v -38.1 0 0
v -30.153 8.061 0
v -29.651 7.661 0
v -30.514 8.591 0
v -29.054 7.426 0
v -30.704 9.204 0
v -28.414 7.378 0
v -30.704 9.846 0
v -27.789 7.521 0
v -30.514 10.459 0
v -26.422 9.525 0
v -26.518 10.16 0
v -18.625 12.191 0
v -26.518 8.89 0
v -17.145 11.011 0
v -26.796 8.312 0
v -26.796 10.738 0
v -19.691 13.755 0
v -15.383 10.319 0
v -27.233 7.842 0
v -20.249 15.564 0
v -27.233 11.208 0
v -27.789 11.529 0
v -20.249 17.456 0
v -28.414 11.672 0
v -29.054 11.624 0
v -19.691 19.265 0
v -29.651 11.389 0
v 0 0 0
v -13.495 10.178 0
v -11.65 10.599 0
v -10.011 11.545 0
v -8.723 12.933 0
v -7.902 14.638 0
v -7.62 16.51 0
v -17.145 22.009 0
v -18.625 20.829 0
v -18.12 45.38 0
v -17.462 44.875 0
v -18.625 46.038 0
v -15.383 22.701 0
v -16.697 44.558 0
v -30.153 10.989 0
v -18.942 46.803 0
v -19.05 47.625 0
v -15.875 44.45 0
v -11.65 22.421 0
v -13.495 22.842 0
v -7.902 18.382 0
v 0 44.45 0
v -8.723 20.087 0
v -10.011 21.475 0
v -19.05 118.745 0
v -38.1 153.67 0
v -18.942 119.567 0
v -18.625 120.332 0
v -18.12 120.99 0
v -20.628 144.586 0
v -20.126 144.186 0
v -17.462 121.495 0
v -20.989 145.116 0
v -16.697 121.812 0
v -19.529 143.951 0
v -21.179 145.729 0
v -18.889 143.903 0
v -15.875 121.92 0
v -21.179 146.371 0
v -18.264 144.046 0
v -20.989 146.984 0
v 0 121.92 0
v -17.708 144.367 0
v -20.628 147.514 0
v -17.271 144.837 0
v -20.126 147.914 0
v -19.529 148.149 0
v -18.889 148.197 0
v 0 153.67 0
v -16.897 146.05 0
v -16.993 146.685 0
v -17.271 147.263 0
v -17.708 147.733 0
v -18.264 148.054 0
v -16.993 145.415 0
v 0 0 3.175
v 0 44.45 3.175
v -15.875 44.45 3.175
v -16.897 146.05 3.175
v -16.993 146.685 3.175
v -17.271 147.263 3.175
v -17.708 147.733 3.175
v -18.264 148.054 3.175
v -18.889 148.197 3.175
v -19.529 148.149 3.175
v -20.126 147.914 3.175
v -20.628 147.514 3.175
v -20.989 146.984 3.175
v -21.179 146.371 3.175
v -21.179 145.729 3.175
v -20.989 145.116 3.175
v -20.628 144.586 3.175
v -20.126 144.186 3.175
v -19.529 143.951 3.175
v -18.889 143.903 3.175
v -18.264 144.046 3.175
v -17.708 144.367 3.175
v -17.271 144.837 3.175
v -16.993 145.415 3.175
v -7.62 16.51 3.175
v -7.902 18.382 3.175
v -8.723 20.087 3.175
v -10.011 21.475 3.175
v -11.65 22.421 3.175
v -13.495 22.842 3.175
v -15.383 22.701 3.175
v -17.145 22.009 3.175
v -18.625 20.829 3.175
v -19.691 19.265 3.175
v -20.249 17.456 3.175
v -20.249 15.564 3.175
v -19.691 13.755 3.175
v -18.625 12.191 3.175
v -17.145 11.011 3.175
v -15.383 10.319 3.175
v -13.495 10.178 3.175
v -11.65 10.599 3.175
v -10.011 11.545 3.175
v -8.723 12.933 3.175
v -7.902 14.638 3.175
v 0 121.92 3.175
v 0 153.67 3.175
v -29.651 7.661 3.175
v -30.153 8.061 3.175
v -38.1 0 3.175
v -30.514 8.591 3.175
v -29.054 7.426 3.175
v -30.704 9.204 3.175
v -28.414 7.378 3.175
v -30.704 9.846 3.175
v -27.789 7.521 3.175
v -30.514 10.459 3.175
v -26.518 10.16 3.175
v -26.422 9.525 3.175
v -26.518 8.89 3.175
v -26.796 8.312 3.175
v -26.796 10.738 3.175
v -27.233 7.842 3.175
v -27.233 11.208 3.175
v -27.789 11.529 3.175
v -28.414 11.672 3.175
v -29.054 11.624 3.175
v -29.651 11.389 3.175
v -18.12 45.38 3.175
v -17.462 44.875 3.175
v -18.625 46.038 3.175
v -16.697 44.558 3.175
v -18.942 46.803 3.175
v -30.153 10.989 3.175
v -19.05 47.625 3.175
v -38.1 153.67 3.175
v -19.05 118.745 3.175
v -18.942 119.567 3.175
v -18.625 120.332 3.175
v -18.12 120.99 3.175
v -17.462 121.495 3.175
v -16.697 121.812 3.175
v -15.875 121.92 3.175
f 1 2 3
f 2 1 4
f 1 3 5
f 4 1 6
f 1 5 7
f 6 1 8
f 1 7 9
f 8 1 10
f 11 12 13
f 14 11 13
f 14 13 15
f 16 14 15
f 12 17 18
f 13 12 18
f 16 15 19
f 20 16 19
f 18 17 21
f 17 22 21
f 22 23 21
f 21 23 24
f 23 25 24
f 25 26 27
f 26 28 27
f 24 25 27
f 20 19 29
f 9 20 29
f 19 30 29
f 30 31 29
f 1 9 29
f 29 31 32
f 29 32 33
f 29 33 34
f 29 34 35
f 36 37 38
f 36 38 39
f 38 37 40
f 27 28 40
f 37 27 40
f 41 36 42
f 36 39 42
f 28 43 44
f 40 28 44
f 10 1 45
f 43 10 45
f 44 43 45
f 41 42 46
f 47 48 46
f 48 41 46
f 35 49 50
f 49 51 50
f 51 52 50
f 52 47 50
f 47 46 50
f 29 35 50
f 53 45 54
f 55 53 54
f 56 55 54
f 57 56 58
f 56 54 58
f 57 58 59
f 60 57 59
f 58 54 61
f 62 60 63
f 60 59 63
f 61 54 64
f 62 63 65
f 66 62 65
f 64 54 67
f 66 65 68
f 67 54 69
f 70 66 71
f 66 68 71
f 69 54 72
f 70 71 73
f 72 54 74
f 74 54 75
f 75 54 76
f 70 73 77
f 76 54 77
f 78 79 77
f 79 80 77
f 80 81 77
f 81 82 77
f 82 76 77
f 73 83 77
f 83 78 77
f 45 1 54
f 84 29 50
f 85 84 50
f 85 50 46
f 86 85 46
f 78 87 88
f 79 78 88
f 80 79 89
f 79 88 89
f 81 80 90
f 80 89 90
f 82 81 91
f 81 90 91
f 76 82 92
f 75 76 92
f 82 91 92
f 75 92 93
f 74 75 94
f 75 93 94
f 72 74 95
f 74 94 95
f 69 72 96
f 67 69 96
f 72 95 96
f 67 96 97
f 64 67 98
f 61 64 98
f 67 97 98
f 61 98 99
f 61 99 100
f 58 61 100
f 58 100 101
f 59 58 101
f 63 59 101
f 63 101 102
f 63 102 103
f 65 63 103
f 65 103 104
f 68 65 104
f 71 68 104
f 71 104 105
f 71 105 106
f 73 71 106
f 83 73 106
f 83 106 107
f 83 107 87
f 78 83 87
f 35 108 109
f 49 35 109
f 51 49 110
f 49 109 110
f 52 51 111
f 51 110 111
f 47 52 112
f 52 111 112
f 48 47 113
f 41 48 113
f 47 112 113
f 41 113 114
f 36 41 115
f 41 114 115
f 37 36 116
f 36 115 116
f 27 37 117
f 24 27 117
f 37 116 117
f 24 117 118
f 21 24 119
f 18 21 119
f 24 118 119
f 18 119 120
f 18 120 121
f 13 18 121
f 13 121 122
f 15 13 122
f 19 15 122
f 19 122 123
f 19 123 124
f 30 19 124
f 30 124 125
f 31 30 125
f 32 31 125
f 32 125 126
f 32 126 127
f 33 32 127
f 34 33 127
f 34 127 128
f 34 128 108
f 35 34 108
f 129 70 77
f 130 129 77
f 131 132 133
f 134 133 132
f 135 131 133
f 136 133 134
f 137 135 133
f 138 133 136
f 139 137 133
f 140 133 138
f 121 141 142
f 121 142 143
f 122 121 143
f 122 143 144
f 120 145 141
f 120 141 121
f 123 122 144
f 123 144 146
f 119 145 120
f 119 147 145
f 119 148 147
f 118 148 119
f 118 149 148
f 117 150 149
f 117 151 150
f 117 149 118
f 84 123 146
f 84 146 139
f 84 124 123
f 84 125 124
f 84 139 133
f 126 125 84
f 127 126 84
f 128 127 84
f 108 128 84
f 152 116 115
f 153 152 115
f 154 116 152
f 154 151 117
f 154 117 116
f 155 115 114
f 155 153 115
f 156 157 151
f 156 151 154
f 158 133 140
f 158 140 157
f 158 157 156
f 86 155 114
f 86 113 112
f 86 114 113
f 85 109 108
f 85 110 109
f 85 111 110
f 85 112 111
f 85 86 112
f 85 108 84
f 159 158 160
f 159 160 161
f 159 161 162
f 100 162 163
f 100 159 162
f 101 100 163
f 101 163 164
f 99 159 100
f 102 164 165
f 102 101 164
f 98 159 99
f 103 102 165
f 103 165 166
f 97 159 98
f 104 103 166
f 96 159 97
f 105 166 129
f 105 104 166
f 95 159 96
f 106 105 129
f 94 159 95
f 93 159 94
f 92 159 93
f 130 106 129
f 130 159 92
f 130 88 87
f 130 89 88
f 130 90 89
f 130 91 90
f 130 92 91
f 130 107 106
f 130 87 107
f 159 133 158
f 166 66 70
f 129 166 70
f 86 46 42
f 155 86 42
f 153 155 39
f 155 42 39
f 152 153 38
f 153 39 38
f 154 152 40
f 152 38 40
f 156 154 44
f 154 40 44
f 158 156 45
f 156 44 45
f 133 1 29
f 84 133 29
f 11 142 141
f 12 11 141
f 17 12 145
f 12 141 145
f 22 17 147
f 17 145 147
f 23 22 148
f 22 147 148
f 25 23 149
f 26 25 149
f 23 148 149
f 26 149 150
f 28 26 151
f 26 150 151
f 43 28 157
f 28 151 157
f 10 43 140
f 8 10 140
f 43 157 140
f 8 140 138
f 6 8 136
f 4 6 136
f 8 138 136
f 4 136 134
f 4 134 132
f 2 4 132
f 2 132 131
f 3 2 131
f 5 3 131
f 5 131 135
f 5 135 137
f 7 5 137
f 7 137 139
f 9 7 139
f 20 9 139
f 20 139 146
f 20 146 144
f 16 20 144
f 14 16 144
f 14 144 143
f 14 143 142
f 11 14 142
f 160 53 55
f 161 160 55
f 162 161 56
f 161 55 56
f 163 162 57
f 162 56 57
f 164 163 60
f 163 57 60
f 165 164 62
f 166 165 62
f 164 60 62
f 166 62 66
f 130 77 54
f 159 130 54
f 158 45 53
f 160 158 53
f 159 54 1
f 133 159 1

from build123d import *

# Parameters (mm, degrees)
BOSS_EXTRUDE1_DEPTH        = 3.175
F_6_CLEARANCE_HOLE1_D      = 4.3053
F_1_2_0_5_DIAMETER_HOLE1_D = 12.7


with BuildPart() as part:
    # Sketch1 → Boss-Extrude1 (new body)
    with BuildSketch(Plane.XY):
        with BuildLine():
            Line((0, 0), (0, 44.45))
            Line((0, 44.45), (-15.875, 44.45))
            ThreePointArc((-15.875, 44.45), (-18.12006403, 45.37993597), (-19.05, 47.625))
            Line((-19.05, 47.625), (-19.05, 118.745))
            ThreePointArc((-19.05, 118.745), (-18.12006403, 120.99006403), (-15.875, 121.92))
            Line((-15.875, 121.92), (0, 121.92))
            Line((0, 121.92), (0, 153.67))
            Line((0, 153.67), (-38.1, 153.67))
            Line((-38.1, 153.67), (-38.1, 0))
            Line((-38.1, 0), (0, 0))
        make_face()
    extrude(amount=BOSS_EXTRUDE1_DEPTH)

    # #6 Clearance Hole1 (through all)
    with Locations(Plane(origin=(0, 0, 0), x_dir=(-1, 0, 0), z_dir=(0, 0, -1))):
        with Locations((28.575, 9.525), (19.05, 146.05)):
            Hole(F_6_CLEARANCE_HOLE1_D / 2)

    # 1/2 (0.5) Diameter Hole1 (through all)
    with Locations(Plane(origin=(0, 0, 0), x_dir=(-1, 0, 0), z_dir=(0, 0, -1))):
        with Locations((13.97, 16.51)):
            Hole(F_1_2_0_5_DIAMETER_HOLE1_D / 2)


solid = part.part
